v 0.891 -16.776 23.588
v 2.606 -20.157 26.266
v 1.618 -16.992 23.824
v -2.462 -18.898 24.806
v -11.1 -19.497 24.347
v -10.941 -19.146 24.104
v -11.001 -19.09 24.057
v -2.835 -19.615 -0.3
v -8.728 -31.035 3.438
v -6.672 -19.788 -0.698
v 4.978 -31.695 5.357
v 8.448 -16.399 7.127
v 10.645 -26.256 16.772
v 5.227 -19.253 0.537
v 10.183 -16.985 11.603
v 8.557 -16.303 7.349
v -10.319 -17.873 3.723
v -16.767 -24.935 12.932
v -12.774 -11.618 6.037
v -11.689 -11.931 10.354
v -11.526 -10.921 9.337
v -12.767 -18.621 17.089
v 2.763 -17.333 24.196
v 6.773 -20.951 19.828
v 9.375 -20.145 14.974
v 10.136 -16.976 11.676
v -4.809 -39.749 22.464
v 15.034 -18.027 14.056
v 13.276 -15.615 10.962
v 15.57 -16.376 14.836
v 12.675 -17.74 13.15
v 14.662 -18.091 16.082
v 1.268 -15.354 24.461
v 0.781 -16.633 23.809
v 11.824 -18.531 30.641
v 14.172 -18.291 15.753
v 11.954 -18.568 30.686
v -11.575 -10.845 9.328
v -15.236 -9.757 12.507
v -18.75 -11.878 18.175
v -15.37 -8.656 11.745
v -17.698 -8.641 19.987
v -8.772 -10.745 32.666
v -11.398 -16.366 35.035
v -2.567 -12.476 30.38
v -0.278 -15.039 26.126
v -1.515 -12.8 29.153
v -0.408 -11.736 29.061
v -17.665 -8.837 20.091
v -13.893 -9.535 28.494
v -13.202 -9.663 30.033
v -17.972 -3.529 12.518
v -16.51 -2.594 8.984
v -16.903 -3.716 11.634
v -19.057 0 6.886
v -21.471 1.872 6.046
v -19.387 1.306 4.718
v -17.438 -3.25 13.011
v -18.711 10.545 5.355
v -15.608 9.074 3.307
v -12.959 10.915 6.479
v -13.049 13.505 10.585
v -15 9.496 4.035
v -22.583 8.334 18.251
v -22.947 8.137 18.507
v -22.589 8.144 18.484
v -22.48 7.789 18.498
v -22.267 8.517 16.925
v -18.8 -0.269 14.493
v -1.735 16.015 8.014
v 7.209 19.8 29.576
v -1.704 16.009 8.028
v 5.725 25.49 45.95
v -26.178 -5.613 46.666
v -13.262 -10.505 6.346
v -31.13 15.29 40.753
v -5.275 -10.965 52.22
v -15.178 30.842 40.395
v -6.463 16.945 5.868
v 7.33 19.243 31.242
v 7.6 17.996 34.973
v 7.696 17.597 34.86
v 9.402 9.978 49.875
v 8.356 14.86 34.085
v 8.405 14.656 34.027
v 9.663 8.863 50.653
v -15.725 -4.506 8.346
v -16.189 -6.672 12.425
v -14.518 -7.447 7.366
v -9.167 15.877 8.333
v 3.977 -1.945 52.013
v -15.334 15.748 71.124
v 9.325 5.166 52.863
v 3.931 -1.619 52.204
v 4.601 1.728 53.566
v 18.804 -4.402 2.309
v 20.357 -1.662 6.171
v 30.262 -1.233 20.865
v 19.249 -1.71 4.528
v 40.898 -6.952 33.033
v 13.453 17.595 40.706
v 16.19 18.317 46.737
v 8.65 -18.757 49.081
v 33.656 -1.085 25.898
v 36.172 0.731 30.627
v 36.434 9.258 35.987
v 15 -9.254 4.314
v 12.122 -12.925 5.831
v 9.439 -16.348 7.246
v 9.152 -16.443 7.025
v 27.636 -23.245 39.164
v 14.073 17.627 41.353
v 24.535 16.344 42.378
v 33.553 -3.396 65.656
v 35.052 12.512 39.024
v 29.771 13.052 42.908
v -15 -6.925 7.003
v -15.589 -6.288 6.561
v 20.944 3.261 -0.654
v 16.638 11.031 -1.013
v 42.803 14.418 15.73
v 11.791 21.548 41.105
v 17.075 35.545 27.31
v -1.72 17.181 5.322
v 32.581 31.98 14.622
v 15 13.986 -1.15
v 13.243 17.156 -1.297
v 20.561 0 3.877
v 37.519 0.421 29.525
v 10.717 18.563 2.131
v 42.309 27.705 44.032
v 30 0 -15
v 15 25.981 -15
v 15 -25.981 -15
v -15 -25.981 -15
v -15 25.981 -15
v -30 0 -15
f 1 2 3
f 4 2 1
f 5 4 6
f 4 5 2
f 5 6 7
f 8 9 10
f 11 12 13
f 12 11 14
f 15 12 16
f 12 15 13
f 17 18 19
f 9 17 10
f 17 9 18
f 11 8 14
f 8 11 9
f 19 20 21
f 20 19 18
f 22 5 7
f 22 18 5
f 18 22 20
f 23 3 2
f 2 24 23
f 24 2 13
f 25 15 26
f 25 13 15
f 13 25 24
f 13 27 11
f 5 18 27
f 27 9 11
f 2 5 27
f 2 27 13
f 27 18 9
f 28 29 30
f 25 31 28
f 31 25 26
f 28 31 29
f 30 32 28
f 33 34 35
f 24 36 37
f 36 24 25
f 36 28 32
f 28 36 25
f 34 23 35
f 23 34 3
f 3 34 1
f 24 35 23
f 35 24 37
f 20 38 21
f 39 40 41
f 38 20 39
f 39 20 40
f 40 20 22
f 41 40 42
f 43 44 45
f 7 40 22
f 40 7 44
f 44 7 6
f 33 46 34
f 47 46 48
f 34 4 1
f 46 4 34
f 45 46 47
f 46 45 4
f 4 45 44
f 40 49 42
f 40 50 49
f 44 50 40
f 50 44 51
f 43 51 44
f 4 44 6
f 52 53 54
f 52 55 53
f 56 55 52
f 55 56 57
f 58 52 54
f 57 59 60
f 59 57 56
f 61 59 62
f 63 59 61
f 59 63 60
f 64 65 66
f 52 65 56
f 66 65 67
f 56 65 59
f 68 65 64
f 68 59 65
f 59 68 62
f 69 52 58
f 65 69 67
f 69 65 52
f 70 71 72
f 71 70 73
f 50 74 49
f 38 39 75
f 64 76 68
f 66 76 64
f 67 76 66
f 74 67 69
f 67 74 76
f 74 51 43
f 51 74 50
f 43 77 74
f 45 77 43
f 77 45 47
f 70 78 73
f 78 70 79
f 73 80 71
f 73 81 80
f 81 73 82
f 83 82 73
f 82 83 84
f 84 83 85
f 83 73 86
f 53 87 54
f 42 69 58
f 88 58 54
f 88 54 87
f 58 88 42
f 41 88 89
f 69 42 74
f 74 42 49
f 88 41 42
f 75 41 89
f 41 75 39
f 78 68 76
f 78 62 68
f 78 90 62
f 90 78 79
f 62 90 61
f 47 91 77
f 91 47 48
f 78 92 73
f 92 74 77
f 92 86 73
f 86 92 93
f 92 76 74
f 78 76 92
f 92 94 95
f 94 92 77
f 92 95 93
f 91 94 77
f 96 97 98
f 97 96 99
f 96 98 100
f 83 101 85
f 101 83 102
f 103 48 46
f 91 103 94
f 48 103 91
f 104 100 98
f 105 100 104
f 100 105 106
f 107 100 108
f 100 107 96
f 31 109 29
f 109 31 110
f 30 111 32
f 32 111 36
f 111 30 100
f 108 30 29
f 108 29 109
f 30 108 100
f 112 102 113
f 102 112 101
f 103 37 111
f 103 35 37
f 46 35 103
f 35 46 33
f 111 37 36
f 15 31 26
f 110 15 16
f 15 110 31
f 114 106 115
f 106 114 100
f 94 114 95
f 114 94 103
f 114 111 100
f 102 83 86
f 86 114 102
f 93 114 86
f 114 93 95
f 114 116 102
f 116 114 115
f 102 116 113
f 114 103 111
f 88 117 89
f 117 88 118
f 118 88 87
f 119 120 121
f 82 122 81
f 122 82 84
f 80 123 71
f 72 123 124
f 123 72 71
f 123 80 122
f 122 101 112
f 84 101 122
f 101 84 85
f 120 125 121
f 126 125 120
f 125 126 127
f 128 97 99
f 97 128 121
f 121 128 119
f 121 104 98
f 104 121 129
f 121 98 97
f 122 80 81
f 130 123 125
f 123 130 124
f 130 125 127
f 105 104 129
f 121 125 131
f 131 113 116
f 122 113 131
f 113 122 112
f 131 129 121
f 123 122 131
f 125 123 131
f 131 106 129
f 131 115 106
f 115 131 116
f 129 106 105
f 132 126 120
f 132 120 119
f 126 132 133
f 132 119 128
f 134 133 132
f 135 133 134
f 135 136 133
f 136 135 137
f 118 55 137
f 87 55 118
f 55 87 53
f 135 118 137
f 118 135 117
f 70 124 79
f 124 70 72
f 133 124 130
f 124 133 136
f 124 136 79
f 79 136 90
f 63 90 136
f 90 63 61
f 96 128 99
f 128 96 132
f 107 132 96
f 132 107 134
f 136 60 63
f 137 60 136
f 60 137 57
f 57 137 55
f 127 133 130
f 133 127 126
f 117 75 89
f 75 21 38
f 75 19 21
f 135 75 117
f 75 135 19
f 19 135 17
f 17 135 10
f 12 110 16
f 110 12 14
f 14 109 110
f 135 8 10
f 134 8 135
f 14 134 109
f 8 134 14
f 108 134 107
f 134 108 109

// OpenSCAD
point_num=8;
tilt=50;
minsize=10;
maxsize=30;
random_seed = 30; // [1:1:100]

cylinder(d1=maxsize*2,d2=maxsize,h=maxsize,$fn=6,center=true);

for(i=[1:100/point_num:100]){
    seed=i-1;
    seed2=i;
    randsem=rands(minsize,maxsize,1);
    single_rand = rands(minsize,maxsize,1)[0];
    echo(single_rand=single_rand);

    random_vect=rands(-1,1,3,seed);
    random_vect2=rands(-tilt,tilt,3,seed2);
    echo(random_vect2);
    translate(random_vect)
        rotate(random_vect2)
            point(single_rand,single_rand*2.5);
}

module point(DI,HI){
    cylinder(d1=DI,d2=DI*1.5,h=HI*.65,$fn=6);
    translate([0,0,HI*.65])
        cylinder(d1=DI*1.5,d2=0,h=HI*.35,$fn=6);
}
